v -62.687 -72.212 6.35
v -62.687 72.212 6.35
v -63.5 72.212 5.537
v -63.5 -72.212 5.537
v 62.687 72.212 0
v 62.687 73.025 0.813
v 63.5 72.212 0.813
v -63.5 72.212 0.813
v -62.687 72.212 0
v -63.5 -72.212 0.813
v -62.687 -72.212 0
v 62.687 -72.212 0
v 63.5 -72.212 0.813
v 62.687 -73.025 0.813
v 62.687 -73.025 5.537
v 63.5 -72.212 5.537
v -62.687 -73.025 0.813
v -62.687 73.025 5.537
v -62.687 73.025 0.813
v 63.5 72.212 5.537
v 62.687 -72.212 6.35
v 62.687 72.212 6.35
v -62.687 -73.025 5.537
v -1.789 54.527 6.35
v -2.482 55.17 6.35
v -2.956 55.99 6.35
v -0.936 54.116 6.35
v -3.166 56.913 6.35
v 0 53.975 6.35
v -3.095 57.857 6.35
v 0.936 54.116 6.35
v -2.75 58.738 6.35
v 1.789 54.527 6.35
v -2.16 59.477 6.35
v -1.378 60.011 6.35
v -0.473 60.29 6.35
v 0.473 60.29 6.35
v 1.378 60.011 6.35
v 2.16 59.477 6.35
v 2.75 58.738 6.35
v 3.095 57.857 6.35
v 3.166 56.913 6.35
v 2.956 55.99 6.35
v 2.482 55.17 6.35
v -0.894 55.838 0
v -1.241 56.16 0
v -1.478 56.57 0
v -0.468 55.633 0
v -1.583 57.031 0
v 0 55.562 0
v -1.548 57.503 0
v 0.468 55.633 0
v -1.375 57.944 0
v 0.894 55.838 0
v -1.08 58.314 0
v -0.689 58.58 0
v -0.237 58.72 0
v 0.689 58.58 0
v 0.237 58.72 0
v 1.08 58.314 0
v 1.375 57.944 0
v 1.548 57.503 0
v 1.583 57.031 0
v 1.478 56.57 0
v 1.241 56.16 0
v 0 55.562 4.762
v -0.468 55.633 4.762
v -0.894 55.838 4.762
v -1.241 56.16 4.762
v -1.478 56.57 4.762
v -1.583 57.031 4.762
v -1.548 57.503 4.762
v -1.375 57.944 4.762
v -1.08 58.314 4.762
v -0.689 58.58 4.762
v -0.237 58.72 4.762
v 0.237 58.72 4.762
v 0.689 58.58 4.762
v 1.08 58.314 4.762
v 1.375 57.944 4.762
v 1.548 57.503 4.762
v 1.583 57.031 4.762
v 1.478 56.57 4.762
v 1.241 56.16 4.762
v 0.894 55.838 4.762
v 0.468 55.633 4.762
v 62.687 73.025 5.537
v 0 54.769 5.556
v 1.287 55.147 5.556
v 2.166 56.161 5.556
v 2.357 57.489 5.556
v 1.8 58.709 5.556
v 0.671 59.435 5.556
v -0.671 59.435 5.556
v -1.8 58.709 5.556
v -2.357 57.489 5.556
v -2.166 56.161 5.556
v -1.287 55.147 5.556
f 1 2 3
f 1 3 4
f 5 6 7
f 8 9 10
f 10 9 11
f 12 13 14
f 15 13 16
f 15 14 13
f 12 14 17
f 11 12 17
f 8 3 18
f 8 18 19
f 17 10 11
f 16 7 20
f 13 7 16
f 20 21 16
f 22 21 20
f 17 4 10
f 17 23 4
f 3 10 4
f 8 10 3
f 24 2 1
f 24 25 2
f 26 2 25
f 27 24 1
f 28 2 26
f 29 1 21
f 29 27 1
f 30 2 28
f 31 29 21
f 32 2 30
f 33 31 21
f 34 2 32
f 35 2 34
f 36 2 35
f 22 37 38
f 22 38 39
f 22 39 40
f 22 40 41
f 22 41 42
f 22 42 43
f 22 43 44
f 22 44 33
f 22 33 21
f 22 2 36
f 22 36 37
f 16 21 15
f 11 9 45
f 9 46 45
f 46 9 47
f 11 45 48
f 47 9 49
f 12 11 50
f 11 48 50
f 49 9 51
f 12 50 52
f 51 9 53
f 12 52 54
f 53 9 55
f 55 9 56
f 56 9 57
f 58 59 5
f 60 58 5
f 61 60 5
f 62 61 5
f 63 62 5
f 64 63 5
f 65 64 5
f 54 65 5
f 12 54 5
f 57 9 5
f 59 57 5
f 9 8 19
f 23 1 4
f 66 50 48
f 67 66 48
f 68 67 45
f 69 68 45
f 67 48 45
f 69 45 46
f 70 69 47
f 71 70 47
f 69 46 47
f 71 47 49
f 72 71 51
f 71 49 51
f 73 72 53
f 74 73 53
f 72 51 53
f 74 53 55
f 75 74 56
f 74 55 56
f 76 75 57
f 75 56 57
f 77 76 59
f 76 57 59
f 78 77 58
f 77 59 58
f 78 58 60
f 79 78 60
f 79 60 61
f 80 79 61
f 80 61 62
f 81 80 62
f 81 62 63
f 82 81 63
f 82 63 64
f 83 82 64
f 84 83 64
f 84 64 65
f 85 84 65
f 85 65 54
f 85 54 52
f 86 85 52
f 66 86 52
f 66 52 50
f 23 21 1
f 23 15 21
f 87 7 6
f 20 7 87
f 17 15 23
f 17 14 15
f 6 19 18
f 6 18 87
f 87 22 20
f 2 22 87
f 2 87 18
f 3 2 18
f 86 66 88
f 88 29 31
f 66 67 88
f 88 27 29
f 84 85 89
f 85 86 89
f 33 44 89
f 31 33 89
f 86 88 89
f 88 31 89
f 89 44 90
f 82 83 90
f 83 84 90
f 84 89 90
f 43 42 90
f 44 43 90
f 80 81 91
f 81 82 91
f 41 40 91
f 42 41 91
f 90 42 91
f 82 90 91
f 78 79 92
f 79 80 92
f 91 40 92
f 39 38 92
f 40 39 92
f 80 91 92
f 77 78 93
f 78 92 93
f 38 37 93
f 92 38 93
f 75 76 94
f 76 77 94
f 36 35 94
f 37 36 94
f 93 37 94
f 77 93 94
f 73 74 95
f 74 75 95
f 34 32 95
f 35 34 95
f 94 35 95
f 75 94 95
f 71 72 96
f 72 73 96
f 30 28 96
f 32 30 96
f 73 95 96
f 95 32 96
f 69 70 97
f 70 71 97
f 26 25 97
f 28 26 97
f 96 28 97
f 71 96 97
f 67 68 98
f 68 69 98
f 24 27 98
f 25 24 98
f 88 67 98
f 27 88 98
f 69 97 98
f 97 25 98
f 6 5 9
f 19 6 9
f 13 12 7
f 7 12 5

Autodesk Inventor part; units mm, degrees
ref_plane "YZ Plane" through (0, 0, 0) normal (1, 0, 0) x (0, 1, 0)
ref_plane "XZ Plane" through (0, 0, 0) normal (0, 1, 0) x (-1, 0, 0)
ref_plane "XY Plane" through (0, 0, 0) normal (0, 0, 1) x (1, 0, 0)
sketch "Sketch1" plane through (0, 0, 0) normal (0, 0, 1) x (1, 0, 0)
  line L0 (-63.5, 73.025) -> (63.5, 73.025)
  line L1 (63.5, 73.025) -> (63.5, -73.025)
  line L2 (63.5, -73.025) -> (-63.5, -73.025)
  line L3 (-63.5, -73.025) -> (-63.5, 73.025)
  point P0 (0, 0)
  dimension "d0" = 127
  dimension "d1" = 146.05
  dimension "d2" = 73.025
  dimension "d3" = 63.5
extrude "Extrusion1" add sketch "Sketch1" along normal blind 6.35
sketch "Sketch2" plane through (0, 0, 6.35) normal (0, 0, 1) x (1, 0, 0)
  line L0 (0, -102.235) -> (0, 102.235) construction
  line L1 (-63.5, 73.025) -> (63.5, 73.025) projected
  line L2 (-63.5, -73.025) -> (-63.5, 73.025) projected
  line L3 (63.5, 73.025) -> (63.5, -73.025) projected
  line L4 (63.5, -73.025) -> (-63.5, -73.025) projected
  line L5 (63.5, 73.025) -> (63.5, -73.025) projected
  line L6 (-63.5, 73.025) -> (63.5, 73.025) projected
  line L7 (-63.5, -73.025) -> (-63.5, 73.025) projected
  line L8 (63.5, -73.025) -> (-63.5, -73.025) projected
  circle A0 centre (0, -6.35) radius 50.8 construction
  point P0 (0, 0)
  point P1 (0, 57.15)
  point P2 (0, -57.15)
  point P3 (-38.1, -39.951)
  point P4 (38.1, -39.951)
  dimension "d15" = 15.875
  dimension "d16" = 15.875
  dimension "d17" = 101.6
  dimension "d18" = 76.2
hole "Hole1" at (0, 57.15, 6.35) direction (0, 0, -1) diameter 3.175 end through all countersink diameter 6.35 countersink angle 90
chamfer "Chamfer1" distance 0.8128 angle 45 12 edges at (0, 73.025, 6.35) (-63.5, 0, 6.35) (63.5, 0, 6.35) (0, -73.025, 6.35) (63.5, 73.025, 3.175) (63.5, -73.025, 3.175) (-63.5, 73.025, 3.175) (-63.5, -73.025, 3.175) (-63.5, 0, 0) (0, 73.025, 0) (63.5, 0, 0) (0, -73.025, 0)
equation "\"d2\" = 0.5 * d1"
equation "\"d3\" = 0.5 * d0"
equation "\"d16\" = d15"
properties part number "J001843" material "GLASS, BOROSILICATE"
